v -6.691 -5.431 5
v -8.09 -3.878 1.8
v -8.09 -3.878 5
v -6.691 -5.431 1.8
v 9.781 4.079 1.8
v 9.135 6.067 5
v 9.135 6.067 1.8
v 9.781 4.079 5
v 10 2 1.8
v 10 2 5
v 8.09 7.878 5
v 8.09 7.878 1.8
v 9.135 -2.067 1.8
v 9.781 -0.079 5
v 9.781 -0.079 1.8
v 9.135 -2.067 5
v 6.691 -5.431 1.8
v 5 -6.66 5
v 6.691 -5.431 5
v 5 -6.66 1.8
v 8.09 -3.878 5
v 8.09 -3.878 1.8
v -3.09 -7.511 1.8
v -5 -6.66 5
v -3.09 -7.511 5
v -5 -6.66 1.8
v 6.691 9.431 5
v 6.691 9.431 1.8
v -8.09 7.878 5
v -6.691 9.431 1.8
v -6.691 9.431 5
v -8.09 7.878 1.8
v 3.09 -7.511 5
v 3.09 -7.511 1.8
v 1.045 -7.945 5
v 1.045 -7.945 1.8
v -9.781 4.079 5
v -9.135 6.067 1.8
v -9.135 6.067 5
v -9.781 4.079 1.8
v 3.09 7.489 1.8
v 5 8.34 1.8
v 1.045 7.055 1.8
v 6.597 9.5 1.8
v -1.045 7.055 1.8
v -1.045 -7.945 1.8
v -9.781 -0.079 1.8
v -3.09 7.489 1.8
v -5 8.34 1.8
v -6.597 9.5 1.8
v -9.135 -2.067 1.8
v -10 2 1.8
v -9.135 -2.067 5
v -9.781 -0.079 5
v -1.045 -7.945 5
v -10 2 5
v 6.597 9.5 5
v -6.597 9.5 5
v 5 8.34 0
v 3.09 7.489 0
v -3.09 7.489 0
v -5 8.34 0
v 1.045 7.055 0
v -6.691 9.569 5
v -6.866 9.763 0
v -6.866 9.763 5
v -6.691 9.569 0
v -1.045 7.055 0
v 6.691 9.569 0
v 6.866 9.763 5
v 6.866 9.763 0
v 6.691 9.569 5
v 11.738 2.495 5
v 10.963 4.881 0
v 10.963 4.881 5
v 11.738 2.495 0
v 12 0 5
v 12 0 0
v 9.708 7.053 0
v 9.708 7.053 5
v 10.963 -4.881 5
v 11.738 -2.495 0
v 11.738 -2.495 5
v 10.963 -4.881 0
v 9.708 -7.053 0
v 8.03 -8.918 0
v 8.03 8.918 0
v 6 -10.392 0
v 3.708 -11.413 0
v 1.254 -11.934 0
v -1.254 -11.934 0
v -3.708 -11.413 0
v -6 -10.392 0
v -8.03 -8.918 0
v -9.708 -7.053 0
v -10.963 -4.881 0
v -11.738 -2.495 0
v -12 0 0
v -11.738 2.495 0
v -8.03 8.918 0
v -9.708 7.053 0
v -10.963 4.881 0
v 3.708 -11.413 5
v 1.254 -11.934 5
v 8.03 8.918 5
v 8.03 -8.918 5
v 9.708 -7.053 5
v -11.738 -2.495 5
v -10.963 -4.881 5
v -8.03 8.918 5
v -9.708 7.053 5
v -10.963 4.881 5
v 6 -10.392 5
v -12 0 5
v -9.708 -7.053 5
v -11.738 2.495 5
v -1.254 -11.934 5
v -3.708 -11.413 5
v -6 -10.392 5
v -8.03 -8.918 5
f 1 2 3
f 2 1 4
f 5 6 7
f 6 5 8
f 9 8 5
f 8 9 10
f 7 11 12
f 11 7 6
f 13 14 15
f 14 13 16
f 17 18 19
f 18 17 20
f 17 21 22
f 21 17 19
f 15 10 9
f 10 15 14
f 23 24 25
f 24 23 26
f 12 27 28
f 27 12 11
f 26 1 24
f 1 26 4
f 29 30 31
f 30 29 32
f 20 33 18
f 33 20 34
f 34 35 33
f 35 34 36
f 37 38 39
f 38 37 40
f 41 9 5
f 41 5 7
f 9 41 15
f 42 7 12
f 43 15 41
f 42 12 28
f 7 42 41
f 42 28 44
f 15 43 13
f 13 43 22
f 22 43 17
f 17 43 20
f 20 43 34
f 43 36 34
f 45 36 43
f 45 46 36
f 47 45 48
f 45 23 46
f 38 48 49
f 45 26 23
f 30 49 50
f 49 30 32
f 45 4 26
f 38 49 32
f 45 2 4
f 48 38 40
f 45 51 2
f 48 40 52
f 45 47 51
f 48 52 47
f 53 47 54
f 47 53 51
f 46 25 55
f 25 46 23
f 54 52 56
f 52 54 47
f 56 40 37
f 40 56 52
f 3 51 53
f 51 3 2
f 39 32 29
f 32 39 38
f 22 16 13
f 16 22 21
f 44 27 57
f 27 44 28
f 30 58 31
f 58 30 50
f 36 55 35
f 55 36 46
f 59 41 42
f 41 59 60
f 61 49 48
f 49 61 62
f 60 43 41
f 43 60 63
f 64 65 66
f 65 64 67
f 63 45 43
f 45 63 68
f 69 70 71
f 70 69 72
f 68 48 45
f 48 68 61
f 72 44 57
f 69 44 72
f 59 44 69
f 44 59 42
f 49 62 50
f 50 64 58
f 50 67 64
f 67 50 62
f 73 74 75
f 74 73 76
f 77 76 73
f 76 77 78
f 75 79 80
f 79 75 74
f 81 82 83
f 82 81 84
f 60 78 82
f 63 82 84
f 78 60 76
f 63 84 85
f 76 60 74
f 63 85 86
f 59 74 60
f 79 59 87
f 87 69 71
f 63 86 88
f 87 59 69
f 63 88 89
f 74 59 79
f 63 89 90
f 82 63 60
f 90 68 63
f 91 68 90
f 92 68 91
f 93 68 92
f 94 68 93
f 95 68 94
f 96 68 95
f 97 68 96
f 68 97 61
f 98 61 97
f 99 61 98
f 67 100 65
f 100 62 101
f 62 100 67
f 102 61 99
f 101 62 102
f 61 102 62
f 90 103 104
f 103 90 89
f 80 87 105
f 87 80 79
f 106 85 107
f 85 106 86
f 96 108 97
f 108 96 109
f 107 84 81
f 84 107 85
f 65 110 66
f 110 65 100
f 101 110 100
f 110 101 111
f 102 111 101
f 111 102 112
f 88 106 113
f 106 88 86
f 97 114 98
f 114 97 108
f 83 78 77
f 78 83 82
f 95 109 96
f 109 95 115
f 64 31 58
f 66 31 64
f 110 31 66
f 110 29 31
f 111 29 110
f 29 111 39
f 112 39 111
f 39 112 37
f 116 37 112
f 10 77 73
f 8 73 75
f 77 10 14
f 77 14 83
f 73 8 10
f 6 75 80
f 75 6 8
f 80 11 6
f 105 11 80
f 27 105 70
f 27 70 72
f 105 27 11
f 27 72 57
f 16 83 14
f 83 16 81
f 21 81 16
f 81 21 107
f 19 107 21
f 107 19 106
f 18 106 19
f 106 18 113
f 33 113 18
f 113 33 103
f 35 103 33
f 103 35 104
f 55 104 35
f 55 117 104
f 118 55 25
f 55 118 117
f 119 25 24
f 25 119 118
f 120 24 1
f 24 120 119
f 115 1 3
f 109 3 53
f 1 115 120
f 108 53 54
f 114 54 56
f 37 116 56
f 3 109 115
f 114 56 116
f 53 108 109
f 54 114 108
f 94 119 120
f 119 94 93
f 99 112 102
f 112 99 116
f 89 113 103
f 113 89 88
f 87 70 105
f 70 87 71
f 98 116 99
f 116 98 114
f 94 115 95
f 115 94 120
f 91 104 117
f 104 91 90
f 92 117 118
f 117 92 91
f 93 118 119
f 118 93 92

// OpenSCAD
//Larger coin cell dia (in mm)
largecelld=24;
//Larger coin cell height (in 0.1mm)
largecellh=50;
//Smaller coin cell dia (in mm)
smallcelld=20;
//Smaller coin cell height (in 0.1mm)
smallcellh=32;

difference() {
    cylinder(largecellh/10,d=largecelld);
    union() {
        translate([0,(largecelld-smallcelld)/2,largecellh/10-smallcellh/10]) cylinder(smallcellh/10+1,d=smallcelld);
        translate([0,largecelld/2+smallcelld*.25,-0.01]) cylinder(largecellh/10+1,d=smallcelld);
    }
}
